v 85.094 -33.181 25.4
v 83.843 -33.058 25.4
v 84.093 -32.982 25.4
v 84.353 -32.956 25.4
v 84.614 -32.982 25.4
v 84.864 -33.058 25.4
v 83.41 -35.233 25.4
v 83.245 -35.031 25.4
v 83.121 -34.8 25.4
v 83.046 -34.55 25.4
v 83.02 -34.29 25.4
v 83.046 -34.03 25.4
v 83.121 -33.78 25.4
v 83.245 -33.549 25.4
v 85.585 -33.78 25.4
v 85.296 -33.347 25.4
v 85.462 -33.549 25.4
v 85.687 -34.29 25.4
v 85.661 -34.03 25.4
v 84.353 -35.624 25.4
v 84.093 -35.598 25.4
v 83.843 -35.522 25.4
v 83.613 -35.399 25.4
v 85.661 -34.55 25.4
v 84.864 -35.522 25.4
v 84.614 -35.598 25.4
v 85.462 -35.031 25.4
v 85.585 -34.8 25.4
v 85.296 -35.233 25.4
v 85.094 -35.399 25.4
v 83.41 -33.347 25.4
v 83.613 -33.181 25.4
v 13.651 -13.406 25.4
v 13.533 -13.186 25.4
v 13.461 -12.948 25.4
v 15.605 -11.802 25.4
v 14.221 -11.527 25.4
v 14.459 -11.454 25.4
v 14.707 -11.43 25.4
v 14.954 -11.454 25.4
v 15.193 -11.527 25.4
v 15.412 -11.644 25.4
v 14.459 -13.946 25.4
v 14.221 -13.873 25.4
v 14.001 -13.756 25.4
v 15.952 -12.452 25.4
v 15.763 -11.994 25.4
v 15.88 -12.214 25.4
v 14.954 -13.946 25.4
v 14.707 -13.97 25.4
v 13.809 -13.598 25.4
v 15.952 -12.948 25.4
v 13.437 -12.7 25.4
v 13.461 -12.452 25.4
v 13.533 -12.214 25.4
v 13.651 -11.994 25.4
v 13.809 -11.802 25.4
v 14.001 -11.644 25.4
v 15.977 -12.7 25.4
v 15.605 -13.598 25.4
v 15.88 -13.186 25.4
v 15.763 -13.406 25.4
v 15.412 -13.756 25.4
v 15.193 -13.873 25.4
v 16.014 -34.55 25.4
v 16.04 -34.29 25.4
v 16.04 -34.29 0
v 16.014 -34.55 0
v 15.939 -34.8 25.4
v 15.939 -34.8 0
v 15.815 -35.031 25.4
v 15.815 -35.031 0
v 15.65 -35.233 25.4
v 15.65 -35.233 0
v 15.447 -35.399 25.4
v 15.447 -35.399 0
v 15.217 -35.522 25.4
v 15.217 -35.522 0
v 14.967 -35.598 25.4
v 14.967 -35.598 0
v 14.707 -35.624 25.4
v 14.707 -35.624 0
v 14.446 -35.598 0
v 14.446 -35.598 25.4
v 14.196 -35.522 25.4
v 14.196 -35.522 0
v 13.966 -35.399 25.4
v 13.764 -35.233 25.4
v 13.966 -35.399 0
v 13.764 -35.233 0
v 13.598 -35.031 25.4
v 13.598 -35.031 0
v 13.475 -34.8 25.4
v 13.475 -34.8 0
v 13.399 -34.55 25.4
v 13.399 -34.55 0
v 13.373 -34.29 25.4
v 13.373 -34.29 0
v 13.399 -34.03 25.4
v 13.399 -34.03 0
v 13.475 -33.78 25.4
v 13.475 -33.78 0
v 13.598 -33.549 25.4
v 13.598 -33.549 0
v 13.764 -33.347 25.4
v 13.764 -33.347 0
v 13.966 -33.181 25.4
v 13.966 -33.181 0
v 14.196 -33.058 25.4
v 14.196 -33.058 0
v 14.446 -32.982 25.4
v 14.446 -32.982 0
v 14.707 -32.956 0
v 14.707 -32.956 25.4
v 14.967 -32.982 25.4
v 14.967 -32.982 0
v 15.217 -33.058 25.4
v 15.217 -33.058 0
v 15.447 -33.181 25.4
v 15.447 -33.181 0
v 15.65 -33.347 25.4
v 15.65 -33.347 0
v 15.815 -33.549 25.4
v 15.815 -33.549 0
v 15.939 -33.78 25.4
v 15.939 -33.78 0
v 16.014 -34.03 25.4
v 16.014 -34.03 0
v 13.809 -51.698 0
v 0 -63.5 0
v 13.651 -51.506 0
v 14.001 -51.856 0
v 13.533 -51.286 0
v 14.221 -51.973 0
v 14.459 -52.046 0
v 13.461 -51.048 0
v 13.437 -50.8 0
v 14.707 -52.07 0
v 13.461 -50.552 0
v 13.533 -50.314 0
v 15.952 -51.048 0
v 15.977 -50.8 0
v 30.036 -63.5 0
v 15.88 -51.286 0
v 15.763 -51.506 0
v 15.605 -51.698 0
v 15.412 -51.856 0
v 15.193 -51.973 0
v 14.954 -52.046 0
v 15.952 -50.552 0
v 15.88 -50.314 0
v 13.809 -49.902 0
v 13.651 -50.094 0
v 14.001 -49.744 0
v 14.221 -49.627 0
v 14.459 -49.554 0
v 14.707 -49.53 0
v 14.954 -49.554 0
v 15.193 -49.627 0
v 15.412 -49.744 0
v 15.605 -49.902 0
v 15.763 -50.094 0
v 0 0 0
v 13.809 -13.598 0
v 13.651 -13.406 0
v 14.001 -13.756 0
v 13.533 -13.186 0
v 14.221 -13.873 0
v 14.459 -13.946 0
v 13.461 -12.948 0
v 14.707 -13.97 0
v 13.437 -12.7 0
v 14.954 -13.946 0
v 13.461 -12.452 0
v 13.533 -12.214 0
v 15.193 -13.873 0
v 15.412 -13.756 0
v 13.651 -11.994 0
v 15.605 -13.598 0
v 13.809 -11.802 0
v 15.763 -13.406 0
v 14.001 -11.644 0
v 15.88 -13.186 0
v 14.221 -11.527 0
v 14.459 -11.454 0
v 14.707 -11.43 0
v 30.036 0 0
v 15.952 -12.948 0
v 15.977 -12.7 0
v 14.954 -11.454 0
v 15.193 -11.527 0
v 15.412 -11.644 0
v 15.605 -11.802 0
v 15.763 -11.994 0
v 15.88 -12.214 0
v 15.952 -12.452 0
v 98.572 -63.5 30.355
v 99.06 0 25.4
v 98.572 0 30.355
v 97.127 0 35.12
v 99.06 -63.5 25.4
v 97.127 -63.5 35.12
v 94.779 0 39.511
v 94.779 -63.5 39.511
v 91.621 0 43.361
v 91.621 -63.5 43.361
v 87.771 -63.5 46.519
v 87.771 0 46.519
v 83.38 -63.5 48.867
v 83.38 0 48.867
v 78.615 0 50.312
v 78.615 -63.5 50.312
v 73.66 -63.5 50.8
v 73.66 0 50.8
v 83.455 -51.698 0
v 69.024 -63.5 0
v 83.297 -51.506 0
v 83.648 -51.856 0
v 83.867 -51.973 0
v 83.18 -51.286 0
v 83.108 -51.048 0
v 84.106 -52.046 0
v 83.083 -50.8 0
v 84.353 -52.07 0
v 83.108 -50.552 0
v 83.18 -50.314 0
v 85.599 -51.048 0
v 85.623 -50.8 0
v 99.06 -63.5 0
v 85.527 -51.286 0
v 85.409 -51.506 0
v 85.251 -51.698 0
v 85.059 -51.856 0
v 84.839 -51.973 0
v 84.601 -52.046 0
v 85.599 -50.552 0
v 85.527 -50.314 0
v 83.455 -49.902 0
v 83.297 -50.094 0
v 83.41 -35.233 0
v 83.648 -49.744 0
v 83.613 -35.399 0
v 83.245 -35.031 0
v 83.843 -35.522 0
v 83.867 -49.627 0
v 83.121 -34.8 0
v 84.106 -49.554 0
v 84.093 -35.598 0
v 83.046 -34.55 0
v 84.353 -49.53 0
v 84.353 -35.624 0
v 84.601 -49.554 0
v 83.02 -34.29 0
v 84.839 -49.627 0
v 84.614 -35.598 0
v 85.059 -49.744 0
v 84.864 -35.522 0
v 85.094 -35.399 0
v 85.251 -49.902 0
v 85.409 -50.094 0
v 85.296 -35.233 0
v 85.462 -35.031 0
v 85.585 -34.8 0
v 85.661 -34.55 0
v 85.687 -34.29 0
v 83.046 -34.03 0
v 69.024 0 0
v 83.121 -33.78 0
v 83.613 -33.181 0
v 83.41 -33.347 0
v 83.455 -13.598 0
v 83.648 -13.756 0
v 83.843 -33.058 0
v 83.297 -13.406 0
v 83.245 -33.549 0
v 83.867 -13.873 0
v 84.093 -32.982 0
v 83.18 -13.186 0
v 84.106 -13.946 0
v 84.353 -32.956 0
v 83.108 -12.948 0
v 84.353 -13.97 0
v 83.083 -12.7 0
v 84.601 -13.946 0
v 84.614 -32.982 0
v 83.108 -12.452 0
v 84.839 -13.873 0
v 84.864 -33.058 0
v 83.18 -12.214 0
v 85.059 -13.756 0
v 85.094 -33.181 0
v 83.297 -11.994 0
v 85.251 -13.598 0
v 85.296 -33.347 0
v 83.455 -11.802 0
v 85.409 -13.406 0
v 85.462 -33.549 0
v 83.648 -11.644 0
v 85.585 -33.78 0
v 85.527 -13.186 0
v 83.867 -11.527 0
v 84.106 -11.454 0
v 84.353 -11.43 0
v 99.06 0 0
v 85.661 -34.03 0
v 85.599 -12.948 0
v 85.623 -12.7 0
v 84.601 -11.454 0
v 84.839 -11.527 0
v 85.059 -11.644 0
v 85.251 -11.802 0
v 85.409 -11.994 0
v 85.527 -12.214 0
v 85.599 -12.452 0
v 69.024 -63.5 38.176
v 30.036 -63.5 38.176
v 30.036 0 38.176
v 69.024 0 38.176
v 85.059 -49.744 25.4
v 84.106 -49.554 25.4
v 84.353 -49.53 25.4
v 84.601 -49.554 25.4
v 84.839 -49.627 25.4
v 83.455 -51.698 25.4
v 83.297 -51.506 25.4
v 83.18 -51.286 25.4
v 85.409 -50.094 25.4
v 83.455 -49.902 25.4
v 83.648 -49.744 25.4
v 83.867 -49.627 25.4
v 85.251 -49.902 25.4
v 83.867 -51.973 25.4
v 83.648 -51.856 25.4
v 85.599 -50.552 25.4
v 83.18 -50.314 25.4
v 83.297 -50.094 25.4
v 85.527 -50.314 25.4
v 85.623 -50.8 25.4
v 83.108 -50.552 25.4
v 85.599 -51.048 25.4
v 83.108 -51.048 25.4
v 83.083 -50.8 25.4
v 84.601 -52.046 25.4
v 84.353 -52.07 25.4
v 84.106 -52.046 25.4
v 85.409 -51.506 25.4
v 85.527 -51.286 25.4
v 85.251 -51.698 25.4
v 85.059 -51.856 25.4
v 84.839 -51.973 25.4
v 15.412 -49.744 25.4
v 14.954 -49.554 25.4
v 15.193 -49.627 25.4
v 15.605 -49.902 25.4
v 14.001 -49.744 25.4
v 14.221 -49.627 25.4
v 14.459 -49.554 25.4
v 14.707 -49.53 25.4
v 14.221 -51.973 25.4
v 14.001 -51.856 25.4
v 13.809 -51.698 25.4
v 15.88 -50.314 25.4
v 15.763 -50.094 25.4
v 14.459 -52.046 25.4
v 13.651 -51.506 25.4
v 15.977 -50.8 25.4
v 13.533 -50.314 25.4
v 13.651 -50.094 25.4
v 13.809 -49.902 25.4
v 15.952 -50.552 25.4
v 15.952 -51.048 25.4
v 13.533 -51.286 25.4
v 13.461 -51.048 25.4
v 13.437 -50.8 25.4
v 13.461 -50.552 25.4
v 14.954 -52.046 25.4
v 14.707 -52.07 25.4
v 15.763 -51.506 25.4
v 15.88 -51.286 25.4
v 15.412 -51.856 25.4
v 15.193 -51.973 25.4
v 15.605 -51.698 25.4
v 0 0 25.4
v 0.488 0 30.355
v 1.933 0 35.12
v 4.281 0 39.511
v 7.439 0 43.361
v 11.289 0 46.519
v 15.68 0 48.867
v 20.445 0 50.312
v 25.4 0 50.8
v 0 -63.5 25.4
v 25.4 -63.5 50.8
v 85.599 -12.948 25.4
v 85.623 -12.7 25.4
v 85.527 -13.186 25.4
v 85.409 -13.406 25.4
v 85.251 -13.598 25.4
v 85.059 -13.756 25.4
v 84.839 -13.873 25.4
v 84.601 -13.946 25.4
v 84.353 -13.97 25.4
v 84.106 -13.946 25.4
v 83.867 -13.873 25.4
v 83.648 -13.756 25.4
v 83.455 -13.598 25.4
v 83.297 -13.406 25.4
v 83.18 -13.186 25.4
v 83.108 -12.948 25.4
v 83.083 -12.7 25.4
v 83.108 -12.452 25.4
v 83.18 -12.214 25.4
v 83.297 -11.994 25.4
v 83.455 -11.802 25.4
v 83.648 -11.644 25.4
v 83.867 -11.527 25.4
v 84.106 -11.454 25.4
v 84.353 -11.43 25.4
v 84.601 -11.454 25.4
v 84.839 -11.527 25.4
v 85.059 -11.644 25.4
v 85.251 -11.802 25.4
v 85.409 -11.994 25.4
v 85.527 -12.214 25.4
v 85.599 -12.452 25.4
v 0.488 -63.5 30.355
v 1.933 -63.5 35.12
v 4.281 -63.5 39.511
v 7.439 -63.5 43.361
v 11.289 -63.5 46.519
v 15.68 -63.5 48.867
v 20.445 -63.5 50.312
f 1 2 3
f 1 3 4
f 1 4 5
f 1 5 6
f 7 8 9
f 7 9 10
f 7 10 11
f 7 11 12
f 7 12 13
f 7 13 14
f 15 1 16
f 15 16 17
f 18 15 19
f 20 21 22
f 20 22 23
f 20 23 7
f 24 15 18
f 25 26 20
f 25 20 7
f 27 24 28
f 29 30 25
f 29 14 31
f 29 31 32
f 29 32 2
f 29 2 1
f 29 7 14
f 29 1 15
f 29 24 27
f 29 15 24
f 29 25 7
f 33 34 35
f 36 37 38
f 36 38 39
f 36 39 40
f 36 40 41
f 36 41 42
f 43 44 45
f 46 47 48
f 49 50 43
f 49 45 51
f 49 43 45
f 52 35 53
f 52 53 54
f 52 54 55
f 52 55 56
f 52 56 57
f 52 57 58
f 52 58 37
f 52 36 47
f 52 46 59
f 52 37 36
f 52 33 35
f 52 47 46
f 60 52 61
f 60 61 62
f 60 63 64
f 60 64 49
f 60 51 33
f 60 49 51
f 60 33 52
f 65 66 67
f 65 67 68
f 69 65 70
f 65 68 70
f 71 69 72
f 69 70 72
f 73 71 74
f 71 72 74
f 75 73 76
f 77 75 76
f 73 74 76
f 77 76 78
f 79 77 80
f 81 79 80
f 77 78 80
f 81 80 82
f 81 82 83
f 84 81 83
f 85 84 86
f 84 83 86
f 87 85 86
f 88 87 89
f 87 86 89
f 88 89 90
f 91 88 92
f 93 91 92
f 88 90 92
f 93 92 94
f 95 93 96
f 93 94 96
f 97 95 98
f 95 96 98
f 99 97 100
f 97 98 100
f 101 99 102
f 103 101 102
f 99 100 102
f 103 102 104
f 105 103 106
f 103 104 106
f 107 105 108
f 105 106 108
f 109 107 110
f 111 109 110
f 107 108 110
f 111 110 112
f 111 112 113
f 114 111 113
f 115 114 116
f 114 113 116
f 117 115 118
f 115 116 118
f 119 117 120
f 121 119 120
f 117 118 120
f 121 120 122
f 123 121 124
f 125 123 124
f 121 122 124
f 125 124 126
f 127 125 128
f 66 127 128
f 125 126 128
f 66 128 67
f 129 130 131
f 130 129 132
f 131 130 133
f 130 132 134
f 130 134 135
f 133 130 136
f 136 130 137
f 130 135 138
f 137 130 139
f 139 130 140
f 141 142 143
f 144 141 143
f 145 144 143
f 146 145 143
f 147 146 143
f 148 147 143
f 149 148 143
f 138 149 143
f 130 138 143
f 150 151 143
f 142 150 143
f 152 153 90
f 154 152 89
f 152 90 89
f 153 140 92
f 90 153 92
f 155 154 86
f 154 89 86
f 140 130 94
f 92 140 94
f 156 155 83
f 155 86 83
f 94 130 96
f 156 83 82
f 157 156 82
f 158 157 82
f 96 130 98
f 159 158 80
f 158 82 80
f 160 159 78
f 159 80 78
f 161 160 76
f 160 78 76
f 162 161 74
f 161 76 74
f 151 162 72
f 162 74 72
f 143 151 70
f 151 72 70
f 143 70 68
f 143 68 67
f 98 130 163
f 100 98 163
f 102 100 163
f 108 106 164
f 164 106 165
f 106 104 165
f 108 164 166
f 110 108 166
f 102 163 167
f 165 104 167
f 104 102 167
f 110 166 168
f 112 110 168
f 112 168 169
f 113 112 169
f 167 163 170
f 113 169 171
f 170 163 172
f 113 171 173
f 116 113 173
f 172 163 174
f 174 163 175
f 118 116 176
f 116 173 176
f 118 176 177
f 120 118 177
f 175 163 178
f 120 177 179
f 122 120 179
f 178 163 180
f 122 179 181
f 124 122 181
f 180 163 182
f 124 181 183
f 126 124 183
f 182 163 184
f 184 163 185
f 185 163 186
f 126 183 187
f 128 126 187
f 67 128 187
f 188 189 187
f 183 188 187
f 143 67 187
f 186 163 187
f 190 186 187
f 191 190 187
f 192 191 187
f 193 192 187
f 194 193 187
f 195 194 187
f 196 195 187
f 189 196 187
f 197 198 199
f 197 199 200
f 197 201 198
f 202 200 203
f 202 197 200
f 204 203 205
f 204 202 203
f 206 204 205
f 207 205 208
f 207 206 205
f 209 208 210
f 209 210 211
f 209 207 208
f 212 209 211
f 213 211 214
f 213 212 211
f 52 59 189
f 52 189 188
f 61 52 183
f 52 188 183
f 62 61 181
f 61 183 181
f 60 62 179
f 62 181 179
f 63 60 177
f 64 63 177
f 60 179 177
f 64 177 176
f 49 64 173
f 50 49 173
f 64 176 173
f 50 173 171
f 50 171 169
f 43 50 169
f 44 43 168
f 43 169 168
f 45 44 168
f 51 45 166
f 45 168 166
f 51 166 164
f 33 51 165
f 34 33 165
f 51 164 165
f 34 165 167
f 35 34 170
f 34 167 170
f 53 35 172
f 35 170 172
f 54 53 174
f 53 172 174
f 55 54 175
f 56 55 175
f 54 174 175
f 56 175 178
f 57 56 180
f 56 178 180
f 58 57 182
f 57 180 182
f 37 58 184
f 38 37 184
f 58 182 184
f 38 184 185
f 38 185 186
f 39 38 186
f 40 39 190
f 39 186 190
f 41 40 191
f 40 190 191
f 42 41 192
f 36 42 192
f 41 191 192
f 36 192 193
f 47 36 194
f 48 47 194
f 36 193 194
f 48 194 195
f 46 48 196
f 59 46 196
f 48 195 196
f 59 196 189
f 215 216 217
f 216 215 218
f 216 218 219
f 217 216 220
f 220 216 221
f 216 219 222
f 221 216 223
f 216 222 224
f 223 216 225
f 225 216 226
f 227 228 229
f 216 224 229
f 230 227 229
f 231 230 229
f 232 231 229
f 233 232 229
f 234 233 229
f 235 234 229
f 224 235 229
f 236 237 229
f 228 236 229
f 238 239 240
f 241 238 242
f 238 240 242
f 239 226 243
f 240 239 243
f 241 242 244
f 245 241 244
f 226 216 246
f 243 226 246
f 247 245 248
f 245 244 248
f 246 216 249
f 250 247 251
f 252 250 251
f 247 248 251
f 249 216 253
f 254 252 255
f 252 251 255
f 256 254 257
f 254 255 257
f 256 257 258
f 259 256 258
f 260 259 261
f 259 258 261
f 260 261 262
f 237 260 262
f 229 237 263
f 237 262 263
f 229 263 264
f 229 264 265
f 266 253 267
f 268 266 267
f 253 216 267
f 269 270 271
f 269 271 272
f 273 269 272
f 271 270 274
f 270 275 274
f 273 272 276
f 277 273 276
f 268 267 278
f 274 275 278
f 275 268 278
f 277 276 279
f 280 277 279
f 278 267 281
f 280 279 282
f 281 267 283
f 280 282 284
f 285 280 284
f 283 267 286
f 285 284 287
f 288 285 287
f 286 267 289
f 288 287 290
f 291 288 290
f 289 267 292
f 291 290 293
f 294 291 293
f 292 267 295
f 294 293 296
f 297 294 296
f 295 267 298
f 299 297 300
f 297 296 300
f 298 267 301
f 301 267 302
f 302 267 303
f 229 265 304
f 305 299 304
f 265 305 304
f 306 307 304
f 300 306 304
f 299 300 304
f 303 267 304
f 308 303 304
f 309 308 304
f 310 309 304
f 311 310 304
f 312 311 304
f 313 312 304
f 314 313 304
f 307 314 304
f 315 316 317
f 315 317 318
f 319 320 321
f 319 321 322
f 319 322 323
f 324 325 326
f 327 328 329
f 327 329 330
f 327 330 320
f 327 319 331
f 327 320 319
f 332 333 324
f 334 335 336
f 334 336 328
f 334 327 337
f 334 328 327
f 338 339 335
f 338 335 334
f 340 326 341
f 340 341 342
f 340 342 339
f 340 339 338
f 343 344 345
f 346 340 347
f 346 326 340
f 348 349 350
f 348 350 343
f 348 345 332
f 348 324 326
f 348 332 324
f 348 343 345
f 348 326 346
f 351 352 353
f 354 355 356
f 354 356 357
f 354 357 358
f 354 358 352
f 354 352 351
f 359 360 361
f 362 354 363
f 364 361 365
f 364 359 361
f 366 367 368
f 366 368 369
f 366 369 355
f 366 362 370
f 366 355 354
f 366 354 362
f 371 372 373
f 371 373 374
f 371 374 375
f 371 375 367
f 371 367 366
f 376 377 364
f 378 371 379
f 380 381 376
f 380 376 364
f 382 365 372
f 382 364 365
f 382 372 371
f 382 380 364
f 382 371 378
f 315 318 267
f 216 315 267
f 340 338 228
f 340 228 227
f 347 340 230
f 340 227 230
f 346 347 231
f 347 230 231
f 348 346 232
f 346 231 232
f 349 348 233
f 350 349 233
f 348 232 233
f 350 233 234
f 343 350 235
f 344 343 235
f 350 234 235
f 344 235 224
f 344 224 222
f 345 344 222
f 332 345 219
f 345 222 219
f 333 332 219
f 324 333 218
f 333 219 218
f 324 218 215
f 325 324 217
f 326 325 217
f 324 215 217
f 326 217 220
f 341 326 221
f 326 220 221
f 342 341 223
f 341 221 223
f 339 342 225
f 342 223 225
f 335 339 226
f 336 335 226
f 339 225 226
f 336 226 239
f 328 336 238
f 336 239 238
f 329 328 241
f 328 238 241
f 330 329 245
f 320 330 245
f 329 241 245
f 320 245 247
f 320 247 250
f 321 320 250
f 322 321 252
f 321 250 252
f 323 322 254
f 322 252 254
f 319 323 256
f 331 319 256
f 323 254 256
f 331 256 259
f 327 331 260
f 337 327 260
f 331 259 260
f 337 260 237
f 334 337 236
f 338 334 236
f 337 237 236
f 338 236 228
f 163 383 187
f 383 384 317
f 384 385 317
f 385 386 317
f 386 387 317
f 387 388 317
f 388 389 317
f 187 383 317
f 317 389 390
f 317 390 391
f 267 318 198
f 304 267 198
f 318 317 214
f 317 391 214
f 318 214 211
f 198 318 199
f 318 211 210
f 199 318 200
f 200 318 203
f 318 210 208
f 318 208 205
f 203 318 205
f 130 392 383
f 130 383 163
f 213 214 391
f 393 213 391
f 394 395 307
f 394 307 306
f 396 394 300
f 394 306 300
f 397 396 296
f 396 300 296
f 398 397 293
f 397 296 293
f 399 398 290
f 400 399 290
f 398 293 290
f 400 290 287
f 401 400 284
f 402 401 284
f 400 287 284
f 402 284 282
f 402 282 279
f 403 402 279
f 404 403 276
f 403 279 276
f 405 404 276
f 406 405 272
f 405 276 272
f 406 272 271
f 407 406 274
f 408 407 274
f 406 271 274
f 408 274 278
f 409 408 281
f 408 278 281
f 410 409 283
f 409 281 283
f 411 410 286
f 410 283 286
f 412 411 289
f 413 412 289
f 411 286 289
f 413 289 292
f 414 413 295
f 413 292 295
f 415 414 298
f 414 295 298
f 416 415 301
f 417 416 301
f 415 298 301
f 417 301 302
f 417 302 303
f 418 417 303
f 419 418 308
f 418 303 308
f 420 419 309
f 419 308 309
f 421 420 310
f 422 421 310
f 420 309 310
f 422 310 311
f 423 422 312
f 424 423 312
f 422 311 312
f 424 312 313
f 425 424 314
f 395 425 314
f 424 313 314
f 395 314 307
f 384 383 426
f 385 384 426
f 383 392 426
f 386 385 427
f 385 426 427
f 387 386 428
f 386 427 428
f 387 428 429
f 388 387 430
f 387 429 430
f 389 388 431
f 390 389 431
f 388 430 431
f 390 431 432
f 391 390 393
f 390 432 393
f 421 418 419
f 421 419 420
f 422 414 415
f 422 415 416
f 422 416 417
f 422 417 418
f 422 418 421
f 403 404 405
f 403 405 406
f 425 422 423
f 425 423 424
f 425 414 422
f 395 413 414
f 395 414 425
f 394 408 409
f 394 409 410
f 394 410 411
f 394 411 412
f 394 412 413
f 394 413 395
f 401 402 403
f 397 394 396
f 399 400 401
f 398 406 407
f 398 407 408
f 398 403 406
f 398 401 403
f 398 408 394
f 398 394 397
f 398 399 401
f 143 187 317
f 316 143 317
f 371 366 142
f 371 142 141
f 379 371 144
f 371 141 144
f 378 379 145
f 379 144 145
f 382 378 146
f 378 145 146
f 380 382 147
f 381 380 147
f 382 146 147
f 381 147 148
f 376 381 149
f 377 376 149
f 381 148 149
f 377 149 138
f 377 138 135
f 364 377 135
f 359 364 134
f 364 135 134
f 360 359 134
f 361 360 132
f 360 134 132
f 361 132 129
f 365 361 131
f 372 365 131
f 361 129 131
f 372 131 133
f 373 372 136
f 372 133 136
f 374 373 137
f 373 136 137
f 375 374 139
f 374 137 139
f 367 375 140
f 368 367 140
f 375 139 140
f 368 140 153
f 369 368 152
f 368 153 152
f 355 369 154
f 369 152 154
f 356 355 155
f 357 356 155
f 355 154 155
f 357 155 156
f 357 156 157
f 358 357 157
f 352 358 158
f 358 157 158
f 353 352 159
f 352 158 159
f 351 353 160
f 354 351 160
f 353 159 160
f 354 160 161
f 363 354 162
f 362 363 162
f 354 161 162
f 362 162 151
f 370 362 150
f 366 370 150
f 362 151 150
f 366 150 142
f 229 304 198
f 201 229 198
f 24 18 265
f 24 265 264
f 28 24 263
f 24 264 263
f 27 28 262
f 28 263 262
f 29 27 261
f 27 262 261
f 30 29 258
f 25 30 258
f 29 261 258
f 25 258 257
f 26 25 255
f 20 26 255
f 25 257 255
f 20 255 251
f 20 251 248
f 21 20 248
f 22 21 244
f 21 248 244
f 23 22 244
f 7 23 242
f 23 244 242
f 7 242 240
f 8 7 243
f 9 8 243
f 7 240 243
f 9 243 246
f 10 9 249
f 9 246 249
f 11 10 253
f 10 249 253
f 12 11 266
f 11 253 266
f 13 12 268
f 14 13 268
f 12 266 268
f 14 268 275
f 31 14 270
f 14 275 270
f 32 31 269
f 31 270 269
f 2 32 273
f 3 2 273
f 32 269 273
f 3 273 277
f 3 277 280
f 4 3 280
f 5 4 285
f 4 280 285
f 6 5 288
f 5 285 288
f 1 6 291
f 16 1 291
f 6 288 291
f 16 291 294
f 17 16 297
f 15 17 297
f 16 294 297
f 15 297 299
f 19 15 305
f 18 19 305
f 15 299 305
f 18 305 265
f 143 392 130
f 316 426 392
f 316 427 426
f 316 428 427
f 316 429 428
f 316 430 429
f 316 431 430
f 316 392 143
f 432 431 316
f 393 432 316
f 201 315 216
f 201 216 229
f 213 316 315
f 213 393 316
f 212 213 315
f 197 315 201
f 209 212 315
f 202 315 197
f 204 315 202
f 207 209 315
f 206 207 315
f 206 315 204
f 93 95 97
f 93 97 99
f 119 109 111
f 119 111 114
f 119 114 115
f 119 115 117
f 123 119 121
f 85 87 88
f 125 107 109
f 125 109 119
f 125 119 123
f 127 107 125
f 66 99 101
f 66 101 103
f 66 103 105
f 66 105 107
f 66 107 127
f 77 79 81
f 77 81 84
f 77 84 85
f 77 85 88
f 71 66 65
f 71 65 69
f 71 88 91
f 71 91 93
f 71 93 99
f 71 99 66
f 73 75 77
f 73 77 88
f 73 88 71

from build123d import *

# Parameters (mm, degrees)
F1_DEPTH = 63.5
F2_R     = 25.4
F3_R     = 1.3335
F3_R_2   = 1.27
F4_DEPTH = 25.4


with BuildPart() as f1:
    # F0 (on Front) → F1 (new body)
    with BuildSketch(Plane.XZ):
        Polygon((0, 50.8), (0, 0), (30.0355, 0), (30.0355, 38.1762), (69.0245, 38.1762), (69.0245, 0), (99.06, 0), (99.06, 50.8), align=None)
    extrude(amount=F1_DEPTH)

    # F2
    f2_edges = [f1.edges().sort_by_distance(p)[0] for p in [
        (99.06, -31.75, 50.8),
        (0, -31.75, 50.8),
    ]]
    fillet(f2_edges, radius=F2_R)

    # F3 (on face) → F4 (cut)
    with BuildSketch(Plane(origin=(0, 0, 0), x_dir=(1, 0, 0), z_dir=(0, 0, -1))):
        with Locations((14.7066, 34.29)):
            Circle(F3_R)
        with Locations((84.3534, 34.29)):
            Circle(F3_R)
        with Locations((14.7066, 12.7)):
            Circle(F3_R_2)
        with Locations((84.3534, 12.7)):
            Circle(F3_R_2)
        with Locations((84.3534, 50.8)):
            Circle(F3_R_2)
        with Locations((14.7066, 50.8)):
            Circle(F3_R_2)
    extrude(amount=-F4_DEPTH, mode=Mode.SUBTRACT)


solid = f1.part
